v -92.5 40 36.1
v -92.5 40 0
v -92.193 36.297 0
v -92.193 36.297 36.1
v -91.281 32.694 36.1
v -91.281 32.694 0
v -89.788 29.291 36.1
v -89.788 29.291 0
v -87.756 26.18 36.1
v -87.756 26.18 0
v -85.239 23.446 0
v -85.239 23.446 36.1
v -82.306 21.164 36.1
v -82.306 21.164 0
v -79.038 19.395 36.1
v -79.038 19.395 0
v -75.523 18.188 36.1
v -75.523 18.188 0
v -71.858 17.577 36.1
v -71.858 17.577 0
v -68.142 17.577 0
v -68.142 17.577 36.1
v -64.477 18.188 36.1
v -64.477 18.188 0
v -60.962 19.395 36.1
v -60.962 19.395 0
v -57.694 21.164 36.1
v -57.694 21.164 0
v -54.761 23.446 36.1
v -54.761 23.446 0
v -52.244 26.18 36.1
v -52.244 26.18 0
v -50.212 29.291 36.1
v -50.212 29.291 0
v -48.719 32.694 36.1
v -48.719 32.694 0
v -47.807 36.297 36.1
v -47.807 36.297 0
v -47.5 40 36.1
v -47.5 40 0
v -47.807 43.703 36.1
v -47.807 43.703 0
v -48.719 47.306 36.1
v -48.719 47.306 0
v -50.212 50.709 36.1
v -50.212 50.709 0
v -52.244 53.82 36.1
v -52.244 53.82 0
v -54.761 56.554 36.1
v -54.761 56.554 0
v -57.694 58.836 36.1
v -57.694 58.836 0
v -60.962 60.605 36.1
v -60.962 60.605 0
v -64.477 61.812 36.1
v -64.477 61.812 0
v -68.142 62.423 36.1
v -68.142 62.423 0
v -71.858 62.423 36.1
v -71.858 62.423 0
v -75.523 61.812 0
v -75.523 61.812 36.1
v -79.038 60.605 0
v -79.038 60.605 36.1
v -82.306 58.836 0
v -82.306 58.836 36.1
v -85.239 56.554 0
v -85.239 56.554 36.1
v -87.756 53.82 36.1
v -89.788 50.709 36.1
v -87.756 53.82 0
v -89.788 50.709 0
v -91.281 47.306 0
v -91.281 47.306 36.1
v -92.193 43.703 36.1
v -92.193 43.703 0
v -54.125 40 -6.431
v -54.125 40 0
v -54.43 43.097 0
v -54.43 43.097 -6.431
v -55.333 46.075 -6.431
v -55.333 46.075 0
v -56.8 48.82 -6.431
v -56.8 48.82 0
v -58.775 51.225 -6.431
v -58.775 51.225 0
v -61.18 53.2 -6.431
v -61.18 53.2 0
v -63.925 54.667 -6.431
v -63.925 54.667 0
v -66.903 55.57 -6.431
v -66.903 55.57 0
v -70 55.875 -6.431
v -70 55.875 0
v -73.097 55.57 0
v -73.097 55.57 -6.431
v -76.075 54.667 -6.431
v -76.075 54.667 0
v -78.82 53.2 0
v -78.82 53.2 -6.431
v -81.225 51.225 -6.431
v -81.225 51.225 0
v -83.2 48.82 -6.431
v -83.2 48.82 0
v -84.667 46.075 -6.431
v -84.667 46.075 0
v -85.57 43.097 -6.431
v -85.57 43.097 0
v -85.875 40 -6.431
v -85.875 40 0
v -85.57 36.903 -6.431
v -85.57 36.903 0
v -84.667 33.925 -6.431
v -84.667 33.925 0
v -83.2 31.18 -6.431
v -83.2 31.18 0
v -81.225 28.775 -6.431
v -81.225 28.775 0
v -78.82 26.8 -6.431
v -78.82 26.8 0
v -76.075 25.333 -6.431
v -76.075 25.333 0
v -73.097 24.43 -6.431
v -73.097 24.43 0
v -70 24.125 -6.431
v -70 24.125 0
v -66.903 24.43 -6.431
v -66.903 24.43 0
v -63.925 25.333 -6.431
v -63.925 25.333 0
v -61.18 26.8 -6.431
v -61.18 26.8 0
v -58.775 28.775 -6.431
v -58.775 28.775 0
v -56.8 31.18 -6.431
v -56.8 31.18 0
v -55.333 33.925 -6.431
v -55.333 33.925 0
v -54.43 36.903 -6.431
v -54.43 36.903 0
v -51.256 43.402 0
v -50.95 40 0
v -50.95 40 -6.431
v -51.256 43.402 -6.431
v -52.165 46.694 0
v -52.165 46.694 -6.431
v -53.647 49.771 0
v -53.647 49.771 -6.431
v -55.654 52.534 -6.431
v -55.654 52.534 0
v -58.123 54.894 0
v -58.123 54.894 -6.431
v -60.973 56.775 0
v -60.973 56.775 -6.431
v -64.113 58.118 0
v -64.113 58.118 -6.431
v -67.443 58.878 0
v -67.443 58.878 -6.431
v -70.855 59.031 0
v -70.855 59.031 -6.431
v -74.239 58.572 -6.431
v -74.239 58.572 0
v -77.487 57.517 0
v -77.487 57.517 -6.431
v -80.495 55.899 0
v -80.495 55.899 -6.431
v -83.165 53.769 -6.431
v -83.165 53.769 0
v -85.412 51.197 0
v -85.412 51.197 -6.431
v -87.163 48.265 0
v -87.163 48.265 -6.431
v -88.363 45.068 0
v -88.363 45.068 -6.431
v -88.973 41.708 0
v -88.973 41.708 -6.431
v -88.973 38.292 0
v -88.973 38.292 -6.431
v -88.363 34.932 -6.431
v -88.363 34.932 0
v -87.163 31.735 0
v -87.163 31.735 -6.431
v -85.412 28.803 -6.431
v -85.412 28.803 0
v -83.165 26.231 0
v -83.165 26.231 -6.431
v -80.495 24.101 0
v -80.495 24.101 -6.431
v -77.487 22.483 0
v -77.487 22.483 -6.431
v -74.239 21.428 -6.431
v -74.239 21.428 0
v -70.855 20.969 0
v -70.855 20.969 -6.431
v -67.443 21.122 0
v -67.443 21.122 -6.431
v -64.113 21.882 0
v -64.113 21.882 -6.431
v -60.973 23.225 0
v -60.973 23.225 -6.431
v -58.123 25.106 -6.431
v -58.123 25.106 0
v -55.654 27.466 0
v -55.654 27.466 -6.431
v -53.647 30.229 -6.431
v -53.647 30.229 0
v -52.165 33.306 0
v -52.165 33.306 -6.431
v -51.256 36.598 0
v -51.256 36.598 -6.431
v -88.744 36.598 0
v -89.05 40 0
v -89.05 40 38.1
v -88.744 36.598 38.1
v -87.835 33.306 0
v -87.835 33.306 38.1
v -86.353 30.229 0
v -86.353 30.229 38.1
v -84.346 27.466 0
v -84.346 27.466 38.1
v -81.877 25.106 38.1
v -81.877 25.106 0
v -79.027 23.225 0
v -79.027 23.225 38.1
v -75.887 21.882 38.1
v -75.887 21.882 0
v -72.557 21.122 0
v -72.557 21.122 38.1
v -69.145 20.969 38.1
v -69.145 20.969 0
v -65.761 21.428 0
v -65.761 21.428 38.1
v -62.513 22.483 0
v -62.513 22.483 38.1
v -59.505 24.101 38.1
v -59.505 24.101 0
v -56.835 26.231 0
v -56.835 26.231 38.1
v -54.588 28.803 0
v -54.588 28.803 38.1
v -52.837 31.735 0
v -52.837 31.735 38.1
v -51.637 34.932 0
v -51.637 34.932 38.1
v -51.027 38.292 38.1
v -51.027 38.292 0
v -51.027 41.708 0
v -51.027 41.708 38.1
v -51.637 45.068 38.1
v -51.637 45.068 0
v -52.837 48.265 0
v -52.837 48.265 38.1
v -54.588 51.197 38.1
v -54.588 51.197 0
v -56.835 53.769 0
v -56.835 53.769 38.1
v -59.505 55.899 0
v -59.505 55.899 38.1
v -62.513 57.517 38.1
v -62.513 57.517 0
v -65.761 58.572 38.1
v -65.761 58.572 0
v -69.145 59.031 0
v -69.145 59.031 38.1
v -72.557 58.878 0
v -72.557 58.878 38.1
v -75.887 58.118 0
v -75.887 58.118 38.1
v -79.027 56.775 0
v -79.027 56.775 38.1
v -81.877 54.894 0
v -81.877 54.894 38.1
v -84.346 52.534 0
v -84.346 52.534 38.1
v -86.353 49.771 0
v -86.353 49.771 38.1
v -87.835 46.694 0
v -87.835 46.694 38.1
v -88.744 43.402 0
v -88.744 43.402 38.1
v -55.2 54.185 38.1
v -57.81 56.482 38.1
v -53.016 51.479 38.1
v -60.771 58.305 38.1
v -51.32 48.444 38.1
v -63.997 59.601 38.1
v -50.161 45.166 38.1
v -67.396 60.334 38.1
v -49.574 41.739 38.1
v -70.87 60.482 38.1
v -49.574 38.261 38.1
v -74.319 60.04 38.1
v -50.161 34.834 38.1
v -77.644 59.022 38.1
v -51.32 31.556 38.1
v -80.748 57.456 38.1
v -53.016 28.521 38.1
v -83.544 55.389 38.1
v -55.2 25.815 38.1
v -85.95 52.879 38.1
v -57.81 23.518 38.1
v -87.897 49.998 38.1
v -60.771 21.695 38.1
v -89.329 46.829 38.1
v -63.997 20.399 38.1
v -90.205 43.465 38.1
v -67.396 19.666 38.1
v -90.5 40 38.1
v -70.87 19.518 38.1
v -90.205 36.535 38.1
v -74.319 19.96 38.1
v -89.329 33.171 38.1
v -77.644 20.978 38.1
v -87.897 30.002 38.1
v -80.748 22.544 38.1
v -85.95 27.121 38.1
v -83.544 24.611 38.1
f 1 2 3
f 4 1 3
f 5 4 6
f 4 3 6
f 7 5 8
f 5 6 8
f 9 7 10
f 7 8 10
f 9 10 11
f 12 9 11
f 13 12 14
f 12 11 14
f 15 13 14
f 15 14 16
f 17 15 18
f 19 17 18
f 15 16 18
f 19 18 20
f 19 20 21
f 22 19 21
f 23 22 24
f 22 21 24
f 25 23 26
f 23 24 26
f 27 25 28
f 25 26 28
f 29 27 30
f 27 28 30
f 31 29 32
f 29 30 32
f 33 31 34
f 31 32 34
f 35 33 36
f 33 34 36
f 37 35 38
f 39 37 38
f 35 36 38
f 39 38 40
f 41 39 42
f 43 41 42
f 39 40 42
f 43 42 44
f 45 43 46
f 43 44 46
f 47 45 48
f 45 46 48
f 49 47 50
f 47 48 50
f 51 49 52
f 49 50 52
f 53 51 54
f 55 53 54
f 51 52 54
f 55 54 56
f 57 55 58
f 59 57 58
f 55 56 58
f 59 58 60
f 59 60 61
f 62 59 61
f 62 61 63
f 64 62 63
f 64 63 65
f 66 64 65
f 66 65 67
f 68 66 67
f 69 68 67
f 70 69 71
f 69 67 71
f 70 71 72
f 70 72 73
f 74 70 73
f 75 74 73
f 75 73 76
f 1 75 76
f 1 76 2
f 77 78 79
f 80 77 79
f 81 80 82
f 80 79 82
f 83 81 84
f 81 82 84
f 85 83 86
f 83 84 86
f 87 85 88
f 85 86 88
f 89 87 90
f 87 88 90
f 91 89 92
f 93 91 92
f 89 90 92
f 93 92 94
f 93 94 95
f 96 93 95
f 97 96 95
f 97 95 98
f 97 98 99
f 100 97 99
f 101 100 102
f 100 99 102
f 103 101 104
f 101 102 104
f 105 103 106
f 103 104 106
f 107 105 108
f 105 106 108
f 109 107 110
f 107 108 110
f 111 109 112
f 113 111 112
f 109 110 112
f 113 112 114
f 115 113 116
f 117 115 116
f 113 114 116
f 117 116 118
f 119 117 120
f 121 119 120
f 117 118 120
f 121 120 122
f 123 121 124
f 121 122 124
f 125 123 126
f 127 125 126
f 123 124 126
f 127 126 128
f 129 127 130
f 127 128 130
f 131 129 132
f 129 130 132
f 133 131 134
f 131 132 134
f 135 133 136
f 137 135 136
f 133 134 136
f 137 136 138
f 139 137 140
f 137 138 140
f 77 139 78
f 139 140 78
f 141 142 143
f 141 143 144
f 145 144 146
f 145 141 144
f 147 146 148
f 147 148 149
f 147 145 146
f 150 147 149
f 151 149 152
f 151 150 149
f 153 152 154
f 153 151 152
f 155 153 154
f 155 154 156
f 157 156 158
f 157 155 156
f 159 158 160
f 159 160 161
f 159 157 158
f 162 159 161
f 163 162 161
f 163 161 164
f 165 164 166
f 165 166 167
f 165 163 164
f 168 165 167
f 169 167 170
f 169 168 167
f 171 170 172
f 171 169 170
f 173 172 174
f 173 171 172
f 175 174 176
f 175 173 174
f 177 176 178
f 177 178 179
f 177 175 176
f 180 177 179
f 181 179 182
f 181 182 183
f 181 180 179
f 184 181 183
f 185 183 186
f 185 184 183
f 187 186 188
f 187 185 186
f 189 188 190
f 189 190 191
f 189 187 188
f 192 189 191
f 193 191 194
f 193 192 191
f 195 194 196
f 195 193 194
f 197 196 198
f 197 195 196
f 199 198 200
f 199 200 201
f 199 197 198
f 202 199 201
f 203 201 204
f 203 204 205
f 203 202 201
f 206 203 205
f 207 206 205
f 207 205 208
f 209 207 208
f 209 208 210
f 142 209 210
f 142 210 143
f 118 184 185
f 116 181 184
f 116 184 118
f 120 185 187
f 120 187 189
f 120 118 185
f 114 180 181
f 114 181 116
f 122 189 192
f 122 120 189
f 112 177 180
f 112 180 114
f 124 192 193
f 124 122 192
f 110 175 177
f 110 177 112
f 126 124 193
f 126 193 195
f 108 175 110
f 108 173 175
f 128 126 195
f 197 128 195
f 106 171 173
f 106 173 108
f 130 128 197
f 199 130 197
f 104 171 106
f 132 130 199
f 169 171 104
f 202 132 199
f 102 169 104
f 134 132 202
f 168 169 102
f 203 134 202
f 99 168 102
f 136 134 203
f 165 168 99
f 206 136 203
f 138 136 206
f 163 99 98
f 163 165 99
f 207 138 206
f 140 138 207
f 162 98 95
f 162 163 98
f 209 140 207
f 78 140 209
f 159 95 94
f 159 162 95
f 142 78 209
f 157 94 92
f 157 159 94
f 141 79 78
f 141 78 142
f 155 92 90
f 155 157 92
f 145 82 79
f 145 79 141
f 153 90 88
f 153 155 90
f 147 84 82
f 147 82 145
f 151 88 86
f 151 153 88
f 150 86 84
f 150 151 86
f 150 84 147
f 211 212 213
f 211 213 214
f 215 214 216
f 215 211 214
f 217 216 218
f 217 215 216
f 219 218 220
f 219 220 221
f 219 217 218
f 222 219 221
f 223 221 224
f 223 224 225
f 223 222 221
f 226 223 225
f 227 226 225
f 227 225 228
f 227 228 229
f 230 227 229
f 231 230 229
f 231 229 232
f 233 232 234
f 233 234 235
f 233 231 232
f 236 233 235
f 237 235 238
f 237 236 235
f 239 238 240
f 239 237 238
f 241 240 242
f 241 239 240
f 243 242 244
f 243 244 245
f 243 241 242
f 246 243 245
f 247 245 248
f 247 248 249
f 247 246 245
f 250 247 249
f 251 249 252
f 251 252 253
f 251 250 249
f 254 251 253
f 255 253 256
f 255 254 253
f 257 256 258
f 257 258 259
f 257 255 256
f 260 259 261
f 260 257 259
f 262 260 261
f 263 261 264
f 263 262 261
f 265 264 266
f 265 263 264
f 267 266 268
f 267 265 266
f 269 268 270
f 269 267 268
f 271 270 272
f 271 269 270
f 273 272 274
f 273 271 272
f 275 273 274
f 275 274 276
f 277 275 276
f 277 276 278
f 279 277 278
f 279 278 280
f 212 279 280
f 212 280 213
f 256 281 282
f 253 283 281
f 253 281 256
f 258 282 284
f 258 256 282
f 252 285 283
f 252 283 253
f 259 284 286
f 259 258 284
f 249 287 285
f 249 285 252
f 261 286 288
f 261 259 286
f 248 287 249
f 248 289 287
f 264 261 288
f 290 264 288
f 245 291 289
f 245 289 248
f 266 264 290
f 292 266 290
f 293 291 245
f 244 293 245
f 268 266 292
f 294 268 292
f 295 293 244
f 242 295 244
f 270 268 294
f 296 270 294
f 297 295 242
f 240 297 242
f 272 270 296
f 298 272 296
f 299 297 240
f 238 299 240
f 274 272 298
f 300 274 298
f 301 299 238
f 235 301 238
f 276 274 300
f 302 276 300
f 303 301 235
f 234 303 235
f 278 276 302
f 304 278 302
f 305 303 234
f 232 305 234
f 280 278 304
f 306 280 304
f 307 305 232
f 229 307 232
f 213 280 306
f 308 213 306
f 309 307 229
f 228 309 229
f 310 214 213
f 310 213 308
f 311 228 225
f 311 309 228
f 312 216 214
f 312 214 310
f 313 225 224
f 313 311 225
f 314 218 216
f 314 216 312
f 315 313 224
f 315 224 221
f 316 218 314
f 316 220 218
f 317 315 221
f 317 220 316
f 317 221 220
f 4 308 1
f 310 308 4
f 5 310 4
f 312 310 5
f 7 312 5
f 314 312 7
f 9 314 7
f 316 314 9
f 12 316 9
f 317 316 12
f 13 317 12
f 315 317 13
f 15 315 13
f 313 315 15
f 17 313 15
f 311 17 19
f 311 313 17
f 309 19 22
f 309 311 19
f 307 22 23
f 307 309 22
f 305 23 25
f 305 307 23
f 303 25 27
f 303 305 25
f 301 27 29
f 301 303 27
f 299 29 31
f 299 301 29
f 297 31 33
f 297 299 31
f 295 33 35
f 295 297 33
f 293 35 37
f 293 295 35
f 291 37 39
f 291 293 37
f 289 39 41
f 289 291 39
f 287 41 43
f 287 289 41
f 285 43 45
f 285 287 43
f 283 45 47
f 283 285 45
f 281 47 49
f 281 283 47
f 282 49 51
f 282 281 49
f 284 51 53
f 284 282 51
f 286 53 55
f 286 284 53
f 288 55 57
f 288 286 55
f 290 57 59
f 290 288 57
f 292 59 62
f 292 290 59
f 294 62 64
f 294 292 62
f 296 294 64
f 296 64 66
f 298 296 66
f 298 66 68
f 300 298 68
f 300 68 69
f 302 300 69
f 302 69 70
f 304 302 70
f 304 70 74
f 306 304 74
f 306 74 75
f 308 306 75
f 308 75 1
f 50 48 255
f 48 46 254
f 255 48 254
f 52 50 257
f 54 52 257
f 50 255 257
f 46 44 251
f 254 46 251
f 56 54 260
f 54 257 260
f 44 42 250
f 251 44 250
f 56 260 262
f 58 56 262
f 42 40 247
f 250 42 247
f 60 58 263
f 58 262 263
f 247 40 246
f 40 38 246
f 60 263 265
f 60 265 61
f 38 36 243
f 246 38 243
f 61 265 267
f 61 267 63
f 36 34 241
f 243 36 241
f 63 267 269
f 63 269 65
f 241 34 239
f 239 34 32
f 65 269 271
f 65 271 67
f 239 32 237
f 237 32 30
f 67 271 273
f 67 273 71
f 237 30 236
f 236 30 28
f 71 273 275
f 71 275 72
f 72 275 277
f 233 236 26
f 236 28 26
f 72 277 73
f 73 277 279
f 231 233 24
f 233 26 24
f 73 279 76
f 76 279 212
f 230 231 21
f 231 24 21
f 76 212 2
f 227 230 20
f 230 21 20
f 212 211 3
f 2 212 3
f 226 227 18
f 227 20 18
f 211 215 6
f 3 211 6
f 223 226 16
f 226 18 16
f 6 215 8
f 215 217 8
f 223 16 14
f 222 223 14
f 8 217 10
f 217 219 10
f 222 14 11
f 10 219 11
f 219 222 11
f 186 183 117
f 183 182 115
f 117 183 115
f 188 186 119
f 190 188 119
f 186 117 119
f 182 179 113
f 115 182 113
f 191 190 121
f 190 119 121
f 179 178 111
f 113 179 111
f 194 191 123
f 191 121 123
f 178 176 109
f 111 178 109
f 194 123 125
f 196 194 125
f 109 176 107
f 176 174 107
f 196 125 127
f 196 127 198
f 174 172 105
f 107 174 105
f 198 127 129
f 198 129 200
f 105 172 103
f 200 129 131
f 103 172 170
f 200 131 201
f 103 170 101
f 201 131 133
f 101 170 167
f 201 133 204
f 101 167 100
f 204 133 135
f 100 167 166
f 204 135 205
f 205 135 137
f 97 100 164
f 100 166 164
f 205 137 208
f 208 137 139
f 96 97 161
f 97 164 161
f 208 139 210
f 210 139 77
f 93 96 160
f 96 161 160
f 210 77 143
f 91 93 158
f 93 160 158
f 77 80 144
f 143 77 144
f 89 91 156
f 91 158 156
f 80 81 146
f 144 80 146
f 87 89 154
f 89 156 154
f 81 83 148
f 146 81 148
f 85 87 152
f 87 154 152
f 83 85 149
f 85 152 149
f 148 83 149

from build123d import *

# Parameters (mm, degrees)
SKETCH1_R           = 22.5
SKETCH1_R_2         = 19.05
BOSS_EXTRUDE1_DEPTH = 38.1
SKETCH2_R           = 19.05
SKETCH2_R_2         = 15.875
BOSS_EXTRUDE2_DEPTH = 6.431433883
CHAMFER1_SIZE       = 2


with BuildPart() as part:
    # Sketch1 → Boss-Extrude1 (new body)
    with BuildSketch(Plane.XY):
        with Locations(Location((-70, 40, 0), (0, 0, 180))):
            Circle(SKETCH1_R)
        with Locations(Location((-70, 40, 0), (0, 0, 180))):
            Circle(SKETCH1_R_2, mode=Mode.SUBTRACT)
    extrude(amount=BOSS_EXTRUDE1_DEPTH)

    # Chamfer1
    chamfer1_edges = [part.edges().sort_by_distance(p)[0] for p in [
        (-47.5, 40, 38.1),
    ]]
    chamfer(chamfer1_edges, length=CHAMFER1_SIZE)


with BuildPart() as body_2:
    # Sketch2 → Boss-Extrude2 (new body)
    with BuildSketch(Plane.XY):
        with Locations((-70, 40)):
            Circle(SKETCH2_R)
        with Locations((-70, 40)):
            Circle(SKETCH2_R_2, mode=Mode.SUBTRACT)
    extrude(amount=-BOSS_EXTRUDE2_DEPTH)


solid = Compound([part.part, body_2.part])
